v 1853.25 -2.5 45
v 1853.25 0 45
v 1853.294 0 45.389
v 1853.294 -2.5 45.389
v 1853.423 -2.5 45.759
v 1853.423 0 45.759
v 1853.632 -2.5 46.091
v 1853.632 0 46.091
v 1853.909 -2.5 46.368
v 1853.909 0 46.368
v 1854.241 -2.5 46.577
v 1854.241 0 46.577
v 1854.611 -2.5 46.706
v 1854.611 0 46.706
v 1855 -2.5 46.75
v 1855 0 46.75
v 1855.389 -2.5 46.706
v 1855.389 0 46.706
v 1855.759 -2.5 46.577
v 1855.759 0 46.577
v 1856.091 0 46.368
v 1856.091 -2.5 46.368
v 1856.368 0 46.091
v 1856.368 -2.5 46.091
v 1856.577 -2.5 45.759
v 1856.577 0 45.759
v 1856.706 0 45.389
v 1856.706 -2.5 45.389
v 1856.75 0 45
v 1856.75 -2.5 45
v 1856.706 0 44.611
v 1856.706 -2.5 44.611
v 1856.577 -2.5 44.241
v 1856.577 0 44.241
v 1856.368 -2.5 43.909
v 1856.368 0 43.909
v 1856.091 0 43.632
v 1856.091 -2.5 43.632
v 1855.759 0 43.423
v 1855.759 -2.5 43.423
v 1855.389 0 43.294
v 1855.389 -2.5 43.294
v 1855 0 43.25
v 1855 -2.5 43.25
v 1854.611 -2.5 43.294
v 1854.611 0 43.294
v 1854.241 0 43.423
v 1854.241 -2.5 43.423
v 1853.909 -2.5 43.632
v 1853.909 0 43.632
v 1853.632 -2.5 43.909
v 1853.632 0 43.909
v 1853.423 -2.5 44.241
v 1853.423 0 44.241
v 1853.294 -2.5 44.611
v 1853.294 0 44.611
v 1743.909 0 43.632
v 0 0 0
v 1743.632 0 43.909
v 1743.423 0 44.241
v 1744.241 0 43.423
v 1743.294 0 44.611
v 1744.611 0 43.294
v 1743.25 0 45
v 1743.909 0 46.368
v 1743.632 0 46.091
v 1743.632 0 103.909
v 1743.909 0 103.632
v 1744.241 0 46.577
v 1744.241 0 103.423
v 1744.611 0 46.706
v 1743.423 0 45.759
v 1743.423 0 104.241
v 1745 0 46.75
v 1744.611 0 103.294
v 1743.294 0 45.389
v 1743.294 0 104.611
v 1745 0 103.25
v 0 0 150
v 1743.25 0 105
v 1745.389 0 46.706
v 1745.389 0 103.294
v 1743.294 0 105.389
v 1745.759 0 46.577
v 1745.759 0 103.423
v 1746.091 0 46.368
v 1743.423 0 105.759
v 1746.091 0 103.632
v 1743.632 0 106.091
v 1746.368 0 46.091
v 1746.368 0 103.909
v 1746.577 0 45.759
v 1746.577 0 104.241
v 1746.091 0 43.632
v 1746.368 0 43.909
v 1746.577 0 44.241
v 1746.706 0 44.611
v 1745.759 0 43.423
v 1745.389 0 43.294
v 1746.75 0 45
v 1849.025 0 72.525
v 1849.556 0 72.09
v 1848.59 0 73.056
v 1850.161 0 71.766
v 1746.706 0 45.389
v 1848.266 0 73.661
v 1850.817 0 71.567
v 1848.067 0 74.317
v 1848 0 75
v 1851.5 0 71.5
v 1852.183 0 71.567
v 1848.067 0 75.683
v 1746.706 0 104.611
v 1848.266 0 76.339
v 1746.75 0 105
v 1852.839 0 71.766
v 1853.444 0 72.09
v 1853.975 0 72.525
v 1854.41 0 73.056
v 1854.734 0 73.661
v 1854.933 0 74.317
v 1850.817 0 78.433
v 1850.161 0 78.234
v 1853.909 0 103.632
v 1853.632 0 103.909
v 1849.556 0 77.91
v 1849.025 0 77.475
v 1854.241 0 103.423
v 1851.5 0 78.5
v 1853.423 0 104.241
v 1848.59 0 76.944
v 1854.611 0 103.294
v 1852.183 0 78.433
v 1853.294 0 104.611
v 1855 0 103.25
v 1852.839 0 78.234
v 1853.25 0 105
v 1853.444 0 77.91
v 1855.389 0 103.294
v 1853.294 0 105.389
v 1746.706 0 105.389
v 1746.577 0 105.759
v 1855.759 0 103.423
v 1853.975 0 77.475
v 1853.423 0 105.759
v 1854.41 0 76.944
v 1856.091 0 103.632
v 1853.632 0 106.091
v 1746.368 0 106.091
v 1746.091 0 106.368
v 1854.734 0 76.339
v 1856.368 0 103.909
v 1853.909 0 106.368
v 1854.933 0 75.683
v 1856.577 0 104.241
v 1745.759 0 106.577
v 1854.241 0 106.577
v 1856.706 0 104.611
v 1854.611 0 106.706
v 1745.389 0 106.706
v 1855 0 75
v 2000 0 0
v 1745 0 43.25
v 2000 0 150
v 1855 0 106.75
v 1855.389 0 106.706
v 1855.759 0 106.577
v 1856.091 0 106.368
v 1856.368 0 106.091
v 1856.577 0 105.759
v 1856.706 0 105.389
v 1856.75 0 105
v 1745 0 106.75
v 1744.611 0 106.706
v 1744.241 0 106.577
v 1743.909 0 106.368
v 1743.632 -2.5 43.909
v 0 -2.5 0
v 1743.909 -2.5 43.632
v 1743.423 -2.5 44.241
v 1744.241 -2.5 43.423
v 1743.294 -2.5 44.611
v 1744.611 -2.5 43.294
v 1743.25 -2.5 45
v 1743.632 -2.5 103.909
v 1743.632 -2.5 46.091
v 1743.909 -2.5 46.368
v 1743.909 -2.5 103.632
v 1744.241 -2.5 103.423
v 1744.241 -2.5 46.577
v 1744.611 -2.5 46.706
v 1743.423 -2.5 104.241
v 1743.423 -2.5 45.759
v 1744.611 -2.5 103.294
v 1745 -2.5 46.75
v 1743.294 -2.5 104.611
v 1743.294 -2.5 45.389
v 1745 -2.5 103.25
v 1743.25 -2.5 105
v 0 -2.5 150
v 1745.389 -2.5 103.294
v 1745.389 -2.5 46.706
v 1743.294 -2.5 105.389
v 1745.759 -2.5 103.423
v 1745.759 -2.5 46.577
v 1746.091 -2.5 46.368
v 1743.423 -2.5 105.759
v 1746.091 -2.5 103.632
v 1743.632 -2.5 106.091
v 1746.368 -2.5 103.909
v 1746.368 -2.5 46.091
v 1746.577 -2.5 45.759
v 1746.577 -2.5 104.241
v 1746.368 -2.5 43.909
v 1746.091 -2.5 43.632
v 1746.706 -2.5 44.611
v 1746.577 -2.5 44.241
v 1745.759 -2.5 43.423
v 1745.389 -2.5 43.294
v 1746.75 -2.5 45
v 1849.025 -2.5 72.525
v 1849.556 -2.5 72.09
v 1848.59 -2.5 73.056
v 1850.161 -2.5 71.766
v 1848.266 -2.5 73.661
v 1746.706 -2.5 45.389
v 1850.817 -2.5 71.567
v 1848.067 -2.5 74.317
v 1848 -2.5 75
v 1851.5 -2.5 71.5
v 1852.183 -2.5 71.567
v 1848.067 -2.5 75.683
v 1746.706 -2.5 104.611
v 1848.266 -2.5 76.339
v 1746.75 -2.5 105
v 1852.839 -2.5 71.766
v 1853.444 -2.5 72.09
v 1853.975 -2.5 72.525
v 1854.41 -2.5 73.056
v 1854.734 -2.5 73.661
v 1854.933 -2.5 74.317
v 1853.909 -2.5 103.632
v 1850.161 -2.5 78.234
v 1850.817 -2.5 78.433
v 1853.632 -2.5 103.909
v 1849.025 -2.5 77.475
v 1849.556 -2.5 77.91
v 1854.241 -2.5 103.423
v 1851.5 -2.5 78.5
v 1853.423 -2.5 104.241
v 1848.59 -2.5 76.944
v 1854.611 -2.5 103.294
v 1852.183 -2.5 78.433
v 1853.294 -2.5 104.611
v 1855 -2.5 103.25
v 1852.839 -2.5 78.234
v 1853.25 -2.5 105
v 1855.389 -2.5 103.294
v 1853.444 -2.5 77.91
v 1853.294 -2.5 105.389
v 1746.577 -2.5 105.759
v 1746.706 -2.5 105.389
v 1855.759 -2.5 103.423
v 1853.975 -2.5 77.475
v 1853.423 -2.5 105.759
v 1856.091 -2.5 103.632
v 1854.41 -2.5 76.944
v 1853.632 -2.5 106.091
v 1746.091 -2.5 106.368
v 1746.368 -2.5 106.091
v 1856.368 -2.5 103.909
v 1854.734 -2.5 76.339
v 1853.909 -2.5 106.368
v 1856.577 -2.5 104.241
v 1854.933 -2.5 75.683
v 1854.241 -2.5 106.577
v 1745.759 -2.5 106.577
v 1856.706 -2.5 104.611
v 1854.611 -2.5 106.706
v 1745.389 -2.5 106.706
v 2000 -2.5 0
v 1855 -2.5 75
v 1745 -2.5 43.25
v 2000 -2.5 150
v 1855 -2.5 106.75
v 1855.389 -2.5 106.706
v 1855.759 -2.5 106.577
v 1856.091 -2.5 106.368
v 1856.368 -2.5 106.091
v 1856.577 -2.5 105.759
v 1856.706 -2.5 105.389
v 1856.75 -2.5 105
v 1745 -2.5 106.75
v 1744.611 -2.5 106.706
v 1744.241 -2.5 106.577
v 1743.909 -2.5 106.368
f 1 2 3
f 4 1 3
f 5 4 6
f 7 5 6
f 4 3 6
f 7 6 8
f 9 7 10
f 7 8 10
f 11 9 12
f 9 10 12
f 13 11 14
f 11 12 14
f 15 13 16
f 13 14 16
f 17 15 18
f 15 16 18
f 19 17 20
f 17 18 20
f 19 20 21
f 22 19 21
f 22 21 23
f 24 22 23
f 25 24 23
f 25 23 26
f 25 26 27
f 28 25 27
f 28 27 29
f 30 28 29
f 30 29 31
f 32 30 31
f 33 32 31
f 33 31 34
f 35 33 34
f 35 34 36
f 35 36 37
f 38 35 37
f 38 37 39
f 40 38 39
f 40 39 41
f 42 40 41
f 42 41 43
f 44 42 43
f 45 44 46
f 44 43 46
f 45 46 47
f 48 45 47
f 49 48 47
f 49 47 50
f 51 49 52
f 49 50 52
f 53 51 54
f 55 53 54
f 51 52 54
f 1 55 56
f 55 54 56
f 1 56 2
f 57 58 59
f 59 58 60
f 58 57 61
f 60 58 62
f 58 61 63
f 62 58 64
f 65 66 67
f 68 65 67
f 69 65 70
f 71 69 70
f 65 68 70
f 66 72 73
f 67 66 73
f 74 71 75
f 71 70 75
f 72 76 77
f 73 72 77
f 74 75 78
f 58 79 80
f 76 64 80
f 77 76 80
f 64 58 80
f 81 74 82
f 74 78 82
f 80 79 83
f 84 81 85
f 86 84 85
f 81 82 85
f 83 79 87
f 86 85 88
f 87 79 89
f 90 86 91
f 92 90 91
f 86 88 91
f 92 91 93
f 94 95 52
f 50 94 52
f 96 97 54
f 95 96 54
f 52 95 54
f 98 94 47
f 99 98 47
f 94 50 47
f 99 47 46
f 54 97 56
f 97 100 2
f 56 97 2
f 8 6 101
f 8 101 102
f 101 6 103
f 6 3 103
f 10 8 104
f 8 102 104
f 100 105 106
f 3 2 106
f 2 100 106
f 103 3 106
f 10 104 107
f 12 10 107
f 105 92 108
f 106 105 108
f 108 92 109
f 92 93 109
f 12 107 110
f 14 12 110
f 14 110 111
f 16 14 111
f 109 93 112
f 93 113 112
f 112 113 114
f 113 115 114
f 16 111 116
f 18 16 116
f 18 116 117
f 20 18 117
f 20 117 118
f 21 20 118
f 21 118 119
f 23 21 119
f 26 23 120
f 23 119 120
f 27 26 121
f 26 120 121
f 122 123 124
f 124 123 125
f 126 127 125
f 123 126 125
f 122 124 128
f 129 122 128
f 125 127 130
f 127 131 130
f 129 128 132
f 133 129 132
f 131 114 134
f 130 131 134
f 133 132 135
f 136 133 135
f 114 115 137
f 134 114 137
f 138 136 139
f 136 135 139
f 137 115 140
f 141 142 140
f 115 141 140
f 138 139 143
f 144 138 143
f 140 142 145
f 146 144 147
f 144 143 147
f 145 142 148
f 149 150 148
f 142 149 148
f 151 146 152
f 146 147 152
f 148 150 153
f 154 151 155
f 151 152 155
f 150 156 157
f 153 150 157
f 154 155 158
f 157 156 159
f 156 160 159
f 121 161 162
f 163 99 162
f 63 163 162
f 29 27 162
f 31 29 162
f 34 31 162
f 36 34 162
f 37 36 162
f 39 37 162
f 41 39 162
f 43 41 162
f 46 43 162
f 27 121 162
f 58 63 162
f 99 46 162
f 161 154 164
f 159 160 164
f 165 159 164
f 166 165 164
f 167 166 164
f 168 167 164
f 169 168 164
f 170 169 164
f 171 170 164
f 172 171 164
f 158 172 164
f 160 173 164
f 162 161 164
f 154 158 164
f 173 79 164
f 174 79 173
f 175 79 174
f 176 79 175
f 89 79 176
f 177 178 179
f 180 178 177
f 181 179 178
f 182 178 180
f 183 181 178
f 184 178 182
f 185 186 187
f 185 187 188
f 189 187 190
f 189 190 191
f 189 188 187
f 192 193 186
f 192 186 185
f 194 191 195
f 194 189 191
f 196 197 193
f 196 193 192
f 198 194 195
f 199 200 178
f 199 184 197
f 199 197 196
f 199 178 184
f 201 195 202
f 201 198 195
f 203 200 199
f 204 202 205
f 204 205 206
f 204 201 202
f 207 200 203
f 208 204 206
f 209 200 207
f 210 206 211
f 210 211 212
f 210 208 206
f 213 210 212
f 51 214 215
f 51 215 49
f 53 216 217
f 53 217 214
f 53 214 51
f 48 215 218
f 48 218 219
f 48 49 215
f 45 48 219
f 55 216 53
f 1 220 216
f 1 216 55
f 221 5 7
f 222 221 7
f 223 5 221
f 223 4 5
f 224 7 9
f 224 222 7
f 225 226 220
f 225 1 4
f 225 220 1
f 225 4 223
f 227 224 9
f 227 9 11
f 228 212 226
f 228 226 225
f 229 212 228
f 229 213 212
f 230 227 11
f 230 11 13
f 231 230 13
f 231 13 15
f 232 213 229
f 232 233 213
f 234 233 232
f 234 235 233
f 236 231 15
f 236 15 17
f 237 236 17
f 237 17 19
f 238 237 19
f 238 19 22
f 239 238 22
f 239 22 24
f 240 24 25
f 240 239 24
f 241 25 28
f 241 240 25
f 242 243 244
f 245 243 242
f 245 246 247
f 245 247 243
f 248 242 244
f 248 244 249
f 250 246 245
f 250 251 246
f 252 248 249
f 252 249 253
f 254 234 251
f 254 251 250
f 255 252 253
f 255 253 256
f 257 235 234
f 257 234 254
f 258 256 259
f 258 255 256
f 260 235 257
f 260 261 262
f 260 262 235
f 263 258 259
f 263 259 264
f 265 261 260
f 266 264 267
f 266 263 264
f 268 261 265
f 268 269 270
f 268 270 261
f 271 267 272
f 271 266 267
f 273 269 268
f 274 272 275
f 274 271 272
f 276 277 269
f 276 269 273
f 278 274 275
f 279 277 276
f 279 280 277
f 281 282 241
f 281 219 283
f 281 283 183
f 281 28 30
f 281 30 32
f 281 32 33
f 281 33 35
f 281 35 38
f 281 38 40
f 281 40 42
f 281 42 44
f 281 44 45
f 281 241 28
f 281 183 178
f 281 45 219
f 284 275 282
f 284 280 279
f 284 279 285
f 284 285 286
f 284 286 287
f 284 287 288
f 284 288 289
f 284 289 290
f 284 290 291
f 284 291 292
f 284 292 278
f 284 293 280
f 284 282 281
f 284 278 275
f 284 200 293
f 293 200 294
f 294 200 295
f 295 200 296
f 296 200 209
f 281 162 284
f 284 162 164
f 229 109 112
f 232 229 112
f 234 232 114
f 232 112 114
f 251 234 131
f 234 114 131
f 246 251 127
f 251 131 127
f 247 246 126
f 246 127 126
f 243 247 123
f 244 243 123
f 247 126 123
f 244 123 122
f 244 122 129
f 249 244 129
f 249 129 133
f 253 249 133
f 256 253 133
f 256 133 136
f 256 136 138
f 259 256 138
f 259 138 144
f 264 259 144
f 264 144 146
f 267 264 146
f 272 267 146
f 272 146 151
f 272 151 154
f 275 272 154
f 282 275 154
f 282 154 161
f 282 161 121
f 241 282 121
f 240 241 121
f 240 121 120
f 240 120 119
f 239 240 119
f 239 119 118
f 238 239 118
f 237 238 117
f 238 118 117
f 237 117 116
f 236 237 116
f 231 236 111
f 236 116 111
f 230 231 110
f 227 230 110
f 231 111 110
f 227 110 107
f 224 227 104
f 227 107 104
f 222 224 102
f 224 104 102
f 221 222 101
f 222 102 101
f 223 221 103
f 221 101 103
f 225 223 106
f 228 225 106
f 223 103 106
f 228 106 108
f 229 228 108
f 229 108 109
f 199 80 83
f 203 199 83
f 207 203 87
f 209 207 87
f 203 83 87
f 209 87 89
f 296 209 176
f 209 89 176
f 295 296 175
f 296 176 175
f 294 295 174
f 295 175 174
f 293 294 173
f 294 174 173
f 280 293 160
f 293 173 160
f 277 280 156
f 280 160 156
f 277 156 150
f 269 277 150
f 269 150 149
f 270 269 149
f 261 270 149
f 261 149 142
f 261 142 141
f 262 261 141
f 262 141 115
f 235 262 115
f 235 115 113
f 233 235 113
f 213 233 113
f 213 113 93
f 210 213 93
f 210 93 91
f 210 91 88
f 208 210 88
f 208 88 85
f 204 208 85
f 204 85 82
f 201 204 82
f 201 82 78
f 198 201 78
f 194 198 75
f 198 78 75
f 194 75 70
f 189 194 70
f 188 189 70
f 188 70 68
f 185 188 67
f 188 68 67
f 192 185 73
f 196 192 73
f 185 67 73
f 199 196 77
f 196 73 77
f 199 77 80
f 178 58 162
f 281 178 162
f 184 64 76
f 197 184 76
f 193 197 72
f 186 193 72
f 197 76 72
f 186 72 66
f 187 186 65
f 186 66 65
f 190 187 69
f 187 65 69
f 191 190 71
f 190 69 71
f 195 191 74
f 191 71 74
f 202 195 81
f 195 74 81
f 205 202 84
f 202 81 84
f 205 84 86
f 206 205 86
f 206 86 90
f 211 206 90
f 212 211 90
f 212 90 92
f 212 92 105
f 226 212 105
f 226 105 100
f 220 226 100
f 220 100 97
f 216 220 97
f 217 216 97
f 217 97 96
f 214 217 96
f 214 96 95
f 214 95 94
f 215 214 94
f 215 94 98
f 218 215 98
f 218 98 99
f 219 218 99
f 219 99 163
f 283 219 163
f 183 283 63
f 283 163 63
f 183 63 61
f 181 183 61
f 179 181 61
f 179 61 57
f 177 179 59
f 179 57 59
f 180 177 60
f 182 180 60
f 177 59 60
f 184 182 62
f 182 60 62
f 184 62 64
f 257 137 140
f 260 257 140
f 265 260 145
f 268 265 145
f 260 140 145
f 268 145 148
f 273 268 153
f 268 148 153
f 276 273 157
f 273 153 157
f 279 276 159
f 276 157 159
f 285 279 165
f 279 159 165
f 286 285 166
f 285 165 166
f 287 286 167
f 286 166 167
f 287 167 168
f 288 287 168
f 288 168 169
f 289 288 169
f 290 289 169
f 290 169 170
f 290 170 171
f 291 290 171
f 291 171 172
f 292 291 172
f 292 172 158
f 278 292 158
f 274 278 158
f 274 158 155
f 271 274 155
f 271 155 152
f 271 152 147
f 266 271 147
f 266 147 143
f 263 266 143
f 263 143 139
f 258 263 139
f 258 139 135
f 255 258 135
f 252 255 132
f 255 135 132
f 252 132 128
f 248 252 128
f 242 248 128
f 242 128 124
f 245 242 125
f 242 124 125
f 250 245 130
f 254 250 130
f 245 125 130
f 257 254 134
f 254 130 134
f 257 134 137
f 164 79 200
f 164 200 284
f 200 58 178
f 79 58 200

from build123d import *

# Parameters (mm, degrees)
F0_W     = 2000
F0_H     = 150
F1_DEPTH = 2.5
F2_R     = 1.75
F2_R_2   = 3.5
F3_DEPTH = 2.501


with BuildPart() as f1:
    # F0 (on Front) → F1 (new body)
    with BuildSketch(Plane.XZ):
        with Locations((1000, 75)):
            Rectangle(F0_W, F0_H)
    extrude(amount=F1_DEPTH)

    # F2 (on face) → F3 (cut, through all)
    with BuildSketch(Plane(origin=(0, 0, 0), x_dir=(-1, 0, 0), z_dir=(0, 1, 0))):
        with Locations((-1855, 105)):
            Circle(F2_R)
        with Locations((-1745, 105)):
            Circle(F2_R)
        with Locations((-1745, 45)):
            Circle(F2_R)
        with Locations((-1855, 45)):
            Circle(F2_R)
        with Locations((-1851.5, 75)):
            Circle(F2_R_2)
    extrude(amount=-F3_DEPTH, mode=Mode.SUBTRACT)


solid = f1.part
